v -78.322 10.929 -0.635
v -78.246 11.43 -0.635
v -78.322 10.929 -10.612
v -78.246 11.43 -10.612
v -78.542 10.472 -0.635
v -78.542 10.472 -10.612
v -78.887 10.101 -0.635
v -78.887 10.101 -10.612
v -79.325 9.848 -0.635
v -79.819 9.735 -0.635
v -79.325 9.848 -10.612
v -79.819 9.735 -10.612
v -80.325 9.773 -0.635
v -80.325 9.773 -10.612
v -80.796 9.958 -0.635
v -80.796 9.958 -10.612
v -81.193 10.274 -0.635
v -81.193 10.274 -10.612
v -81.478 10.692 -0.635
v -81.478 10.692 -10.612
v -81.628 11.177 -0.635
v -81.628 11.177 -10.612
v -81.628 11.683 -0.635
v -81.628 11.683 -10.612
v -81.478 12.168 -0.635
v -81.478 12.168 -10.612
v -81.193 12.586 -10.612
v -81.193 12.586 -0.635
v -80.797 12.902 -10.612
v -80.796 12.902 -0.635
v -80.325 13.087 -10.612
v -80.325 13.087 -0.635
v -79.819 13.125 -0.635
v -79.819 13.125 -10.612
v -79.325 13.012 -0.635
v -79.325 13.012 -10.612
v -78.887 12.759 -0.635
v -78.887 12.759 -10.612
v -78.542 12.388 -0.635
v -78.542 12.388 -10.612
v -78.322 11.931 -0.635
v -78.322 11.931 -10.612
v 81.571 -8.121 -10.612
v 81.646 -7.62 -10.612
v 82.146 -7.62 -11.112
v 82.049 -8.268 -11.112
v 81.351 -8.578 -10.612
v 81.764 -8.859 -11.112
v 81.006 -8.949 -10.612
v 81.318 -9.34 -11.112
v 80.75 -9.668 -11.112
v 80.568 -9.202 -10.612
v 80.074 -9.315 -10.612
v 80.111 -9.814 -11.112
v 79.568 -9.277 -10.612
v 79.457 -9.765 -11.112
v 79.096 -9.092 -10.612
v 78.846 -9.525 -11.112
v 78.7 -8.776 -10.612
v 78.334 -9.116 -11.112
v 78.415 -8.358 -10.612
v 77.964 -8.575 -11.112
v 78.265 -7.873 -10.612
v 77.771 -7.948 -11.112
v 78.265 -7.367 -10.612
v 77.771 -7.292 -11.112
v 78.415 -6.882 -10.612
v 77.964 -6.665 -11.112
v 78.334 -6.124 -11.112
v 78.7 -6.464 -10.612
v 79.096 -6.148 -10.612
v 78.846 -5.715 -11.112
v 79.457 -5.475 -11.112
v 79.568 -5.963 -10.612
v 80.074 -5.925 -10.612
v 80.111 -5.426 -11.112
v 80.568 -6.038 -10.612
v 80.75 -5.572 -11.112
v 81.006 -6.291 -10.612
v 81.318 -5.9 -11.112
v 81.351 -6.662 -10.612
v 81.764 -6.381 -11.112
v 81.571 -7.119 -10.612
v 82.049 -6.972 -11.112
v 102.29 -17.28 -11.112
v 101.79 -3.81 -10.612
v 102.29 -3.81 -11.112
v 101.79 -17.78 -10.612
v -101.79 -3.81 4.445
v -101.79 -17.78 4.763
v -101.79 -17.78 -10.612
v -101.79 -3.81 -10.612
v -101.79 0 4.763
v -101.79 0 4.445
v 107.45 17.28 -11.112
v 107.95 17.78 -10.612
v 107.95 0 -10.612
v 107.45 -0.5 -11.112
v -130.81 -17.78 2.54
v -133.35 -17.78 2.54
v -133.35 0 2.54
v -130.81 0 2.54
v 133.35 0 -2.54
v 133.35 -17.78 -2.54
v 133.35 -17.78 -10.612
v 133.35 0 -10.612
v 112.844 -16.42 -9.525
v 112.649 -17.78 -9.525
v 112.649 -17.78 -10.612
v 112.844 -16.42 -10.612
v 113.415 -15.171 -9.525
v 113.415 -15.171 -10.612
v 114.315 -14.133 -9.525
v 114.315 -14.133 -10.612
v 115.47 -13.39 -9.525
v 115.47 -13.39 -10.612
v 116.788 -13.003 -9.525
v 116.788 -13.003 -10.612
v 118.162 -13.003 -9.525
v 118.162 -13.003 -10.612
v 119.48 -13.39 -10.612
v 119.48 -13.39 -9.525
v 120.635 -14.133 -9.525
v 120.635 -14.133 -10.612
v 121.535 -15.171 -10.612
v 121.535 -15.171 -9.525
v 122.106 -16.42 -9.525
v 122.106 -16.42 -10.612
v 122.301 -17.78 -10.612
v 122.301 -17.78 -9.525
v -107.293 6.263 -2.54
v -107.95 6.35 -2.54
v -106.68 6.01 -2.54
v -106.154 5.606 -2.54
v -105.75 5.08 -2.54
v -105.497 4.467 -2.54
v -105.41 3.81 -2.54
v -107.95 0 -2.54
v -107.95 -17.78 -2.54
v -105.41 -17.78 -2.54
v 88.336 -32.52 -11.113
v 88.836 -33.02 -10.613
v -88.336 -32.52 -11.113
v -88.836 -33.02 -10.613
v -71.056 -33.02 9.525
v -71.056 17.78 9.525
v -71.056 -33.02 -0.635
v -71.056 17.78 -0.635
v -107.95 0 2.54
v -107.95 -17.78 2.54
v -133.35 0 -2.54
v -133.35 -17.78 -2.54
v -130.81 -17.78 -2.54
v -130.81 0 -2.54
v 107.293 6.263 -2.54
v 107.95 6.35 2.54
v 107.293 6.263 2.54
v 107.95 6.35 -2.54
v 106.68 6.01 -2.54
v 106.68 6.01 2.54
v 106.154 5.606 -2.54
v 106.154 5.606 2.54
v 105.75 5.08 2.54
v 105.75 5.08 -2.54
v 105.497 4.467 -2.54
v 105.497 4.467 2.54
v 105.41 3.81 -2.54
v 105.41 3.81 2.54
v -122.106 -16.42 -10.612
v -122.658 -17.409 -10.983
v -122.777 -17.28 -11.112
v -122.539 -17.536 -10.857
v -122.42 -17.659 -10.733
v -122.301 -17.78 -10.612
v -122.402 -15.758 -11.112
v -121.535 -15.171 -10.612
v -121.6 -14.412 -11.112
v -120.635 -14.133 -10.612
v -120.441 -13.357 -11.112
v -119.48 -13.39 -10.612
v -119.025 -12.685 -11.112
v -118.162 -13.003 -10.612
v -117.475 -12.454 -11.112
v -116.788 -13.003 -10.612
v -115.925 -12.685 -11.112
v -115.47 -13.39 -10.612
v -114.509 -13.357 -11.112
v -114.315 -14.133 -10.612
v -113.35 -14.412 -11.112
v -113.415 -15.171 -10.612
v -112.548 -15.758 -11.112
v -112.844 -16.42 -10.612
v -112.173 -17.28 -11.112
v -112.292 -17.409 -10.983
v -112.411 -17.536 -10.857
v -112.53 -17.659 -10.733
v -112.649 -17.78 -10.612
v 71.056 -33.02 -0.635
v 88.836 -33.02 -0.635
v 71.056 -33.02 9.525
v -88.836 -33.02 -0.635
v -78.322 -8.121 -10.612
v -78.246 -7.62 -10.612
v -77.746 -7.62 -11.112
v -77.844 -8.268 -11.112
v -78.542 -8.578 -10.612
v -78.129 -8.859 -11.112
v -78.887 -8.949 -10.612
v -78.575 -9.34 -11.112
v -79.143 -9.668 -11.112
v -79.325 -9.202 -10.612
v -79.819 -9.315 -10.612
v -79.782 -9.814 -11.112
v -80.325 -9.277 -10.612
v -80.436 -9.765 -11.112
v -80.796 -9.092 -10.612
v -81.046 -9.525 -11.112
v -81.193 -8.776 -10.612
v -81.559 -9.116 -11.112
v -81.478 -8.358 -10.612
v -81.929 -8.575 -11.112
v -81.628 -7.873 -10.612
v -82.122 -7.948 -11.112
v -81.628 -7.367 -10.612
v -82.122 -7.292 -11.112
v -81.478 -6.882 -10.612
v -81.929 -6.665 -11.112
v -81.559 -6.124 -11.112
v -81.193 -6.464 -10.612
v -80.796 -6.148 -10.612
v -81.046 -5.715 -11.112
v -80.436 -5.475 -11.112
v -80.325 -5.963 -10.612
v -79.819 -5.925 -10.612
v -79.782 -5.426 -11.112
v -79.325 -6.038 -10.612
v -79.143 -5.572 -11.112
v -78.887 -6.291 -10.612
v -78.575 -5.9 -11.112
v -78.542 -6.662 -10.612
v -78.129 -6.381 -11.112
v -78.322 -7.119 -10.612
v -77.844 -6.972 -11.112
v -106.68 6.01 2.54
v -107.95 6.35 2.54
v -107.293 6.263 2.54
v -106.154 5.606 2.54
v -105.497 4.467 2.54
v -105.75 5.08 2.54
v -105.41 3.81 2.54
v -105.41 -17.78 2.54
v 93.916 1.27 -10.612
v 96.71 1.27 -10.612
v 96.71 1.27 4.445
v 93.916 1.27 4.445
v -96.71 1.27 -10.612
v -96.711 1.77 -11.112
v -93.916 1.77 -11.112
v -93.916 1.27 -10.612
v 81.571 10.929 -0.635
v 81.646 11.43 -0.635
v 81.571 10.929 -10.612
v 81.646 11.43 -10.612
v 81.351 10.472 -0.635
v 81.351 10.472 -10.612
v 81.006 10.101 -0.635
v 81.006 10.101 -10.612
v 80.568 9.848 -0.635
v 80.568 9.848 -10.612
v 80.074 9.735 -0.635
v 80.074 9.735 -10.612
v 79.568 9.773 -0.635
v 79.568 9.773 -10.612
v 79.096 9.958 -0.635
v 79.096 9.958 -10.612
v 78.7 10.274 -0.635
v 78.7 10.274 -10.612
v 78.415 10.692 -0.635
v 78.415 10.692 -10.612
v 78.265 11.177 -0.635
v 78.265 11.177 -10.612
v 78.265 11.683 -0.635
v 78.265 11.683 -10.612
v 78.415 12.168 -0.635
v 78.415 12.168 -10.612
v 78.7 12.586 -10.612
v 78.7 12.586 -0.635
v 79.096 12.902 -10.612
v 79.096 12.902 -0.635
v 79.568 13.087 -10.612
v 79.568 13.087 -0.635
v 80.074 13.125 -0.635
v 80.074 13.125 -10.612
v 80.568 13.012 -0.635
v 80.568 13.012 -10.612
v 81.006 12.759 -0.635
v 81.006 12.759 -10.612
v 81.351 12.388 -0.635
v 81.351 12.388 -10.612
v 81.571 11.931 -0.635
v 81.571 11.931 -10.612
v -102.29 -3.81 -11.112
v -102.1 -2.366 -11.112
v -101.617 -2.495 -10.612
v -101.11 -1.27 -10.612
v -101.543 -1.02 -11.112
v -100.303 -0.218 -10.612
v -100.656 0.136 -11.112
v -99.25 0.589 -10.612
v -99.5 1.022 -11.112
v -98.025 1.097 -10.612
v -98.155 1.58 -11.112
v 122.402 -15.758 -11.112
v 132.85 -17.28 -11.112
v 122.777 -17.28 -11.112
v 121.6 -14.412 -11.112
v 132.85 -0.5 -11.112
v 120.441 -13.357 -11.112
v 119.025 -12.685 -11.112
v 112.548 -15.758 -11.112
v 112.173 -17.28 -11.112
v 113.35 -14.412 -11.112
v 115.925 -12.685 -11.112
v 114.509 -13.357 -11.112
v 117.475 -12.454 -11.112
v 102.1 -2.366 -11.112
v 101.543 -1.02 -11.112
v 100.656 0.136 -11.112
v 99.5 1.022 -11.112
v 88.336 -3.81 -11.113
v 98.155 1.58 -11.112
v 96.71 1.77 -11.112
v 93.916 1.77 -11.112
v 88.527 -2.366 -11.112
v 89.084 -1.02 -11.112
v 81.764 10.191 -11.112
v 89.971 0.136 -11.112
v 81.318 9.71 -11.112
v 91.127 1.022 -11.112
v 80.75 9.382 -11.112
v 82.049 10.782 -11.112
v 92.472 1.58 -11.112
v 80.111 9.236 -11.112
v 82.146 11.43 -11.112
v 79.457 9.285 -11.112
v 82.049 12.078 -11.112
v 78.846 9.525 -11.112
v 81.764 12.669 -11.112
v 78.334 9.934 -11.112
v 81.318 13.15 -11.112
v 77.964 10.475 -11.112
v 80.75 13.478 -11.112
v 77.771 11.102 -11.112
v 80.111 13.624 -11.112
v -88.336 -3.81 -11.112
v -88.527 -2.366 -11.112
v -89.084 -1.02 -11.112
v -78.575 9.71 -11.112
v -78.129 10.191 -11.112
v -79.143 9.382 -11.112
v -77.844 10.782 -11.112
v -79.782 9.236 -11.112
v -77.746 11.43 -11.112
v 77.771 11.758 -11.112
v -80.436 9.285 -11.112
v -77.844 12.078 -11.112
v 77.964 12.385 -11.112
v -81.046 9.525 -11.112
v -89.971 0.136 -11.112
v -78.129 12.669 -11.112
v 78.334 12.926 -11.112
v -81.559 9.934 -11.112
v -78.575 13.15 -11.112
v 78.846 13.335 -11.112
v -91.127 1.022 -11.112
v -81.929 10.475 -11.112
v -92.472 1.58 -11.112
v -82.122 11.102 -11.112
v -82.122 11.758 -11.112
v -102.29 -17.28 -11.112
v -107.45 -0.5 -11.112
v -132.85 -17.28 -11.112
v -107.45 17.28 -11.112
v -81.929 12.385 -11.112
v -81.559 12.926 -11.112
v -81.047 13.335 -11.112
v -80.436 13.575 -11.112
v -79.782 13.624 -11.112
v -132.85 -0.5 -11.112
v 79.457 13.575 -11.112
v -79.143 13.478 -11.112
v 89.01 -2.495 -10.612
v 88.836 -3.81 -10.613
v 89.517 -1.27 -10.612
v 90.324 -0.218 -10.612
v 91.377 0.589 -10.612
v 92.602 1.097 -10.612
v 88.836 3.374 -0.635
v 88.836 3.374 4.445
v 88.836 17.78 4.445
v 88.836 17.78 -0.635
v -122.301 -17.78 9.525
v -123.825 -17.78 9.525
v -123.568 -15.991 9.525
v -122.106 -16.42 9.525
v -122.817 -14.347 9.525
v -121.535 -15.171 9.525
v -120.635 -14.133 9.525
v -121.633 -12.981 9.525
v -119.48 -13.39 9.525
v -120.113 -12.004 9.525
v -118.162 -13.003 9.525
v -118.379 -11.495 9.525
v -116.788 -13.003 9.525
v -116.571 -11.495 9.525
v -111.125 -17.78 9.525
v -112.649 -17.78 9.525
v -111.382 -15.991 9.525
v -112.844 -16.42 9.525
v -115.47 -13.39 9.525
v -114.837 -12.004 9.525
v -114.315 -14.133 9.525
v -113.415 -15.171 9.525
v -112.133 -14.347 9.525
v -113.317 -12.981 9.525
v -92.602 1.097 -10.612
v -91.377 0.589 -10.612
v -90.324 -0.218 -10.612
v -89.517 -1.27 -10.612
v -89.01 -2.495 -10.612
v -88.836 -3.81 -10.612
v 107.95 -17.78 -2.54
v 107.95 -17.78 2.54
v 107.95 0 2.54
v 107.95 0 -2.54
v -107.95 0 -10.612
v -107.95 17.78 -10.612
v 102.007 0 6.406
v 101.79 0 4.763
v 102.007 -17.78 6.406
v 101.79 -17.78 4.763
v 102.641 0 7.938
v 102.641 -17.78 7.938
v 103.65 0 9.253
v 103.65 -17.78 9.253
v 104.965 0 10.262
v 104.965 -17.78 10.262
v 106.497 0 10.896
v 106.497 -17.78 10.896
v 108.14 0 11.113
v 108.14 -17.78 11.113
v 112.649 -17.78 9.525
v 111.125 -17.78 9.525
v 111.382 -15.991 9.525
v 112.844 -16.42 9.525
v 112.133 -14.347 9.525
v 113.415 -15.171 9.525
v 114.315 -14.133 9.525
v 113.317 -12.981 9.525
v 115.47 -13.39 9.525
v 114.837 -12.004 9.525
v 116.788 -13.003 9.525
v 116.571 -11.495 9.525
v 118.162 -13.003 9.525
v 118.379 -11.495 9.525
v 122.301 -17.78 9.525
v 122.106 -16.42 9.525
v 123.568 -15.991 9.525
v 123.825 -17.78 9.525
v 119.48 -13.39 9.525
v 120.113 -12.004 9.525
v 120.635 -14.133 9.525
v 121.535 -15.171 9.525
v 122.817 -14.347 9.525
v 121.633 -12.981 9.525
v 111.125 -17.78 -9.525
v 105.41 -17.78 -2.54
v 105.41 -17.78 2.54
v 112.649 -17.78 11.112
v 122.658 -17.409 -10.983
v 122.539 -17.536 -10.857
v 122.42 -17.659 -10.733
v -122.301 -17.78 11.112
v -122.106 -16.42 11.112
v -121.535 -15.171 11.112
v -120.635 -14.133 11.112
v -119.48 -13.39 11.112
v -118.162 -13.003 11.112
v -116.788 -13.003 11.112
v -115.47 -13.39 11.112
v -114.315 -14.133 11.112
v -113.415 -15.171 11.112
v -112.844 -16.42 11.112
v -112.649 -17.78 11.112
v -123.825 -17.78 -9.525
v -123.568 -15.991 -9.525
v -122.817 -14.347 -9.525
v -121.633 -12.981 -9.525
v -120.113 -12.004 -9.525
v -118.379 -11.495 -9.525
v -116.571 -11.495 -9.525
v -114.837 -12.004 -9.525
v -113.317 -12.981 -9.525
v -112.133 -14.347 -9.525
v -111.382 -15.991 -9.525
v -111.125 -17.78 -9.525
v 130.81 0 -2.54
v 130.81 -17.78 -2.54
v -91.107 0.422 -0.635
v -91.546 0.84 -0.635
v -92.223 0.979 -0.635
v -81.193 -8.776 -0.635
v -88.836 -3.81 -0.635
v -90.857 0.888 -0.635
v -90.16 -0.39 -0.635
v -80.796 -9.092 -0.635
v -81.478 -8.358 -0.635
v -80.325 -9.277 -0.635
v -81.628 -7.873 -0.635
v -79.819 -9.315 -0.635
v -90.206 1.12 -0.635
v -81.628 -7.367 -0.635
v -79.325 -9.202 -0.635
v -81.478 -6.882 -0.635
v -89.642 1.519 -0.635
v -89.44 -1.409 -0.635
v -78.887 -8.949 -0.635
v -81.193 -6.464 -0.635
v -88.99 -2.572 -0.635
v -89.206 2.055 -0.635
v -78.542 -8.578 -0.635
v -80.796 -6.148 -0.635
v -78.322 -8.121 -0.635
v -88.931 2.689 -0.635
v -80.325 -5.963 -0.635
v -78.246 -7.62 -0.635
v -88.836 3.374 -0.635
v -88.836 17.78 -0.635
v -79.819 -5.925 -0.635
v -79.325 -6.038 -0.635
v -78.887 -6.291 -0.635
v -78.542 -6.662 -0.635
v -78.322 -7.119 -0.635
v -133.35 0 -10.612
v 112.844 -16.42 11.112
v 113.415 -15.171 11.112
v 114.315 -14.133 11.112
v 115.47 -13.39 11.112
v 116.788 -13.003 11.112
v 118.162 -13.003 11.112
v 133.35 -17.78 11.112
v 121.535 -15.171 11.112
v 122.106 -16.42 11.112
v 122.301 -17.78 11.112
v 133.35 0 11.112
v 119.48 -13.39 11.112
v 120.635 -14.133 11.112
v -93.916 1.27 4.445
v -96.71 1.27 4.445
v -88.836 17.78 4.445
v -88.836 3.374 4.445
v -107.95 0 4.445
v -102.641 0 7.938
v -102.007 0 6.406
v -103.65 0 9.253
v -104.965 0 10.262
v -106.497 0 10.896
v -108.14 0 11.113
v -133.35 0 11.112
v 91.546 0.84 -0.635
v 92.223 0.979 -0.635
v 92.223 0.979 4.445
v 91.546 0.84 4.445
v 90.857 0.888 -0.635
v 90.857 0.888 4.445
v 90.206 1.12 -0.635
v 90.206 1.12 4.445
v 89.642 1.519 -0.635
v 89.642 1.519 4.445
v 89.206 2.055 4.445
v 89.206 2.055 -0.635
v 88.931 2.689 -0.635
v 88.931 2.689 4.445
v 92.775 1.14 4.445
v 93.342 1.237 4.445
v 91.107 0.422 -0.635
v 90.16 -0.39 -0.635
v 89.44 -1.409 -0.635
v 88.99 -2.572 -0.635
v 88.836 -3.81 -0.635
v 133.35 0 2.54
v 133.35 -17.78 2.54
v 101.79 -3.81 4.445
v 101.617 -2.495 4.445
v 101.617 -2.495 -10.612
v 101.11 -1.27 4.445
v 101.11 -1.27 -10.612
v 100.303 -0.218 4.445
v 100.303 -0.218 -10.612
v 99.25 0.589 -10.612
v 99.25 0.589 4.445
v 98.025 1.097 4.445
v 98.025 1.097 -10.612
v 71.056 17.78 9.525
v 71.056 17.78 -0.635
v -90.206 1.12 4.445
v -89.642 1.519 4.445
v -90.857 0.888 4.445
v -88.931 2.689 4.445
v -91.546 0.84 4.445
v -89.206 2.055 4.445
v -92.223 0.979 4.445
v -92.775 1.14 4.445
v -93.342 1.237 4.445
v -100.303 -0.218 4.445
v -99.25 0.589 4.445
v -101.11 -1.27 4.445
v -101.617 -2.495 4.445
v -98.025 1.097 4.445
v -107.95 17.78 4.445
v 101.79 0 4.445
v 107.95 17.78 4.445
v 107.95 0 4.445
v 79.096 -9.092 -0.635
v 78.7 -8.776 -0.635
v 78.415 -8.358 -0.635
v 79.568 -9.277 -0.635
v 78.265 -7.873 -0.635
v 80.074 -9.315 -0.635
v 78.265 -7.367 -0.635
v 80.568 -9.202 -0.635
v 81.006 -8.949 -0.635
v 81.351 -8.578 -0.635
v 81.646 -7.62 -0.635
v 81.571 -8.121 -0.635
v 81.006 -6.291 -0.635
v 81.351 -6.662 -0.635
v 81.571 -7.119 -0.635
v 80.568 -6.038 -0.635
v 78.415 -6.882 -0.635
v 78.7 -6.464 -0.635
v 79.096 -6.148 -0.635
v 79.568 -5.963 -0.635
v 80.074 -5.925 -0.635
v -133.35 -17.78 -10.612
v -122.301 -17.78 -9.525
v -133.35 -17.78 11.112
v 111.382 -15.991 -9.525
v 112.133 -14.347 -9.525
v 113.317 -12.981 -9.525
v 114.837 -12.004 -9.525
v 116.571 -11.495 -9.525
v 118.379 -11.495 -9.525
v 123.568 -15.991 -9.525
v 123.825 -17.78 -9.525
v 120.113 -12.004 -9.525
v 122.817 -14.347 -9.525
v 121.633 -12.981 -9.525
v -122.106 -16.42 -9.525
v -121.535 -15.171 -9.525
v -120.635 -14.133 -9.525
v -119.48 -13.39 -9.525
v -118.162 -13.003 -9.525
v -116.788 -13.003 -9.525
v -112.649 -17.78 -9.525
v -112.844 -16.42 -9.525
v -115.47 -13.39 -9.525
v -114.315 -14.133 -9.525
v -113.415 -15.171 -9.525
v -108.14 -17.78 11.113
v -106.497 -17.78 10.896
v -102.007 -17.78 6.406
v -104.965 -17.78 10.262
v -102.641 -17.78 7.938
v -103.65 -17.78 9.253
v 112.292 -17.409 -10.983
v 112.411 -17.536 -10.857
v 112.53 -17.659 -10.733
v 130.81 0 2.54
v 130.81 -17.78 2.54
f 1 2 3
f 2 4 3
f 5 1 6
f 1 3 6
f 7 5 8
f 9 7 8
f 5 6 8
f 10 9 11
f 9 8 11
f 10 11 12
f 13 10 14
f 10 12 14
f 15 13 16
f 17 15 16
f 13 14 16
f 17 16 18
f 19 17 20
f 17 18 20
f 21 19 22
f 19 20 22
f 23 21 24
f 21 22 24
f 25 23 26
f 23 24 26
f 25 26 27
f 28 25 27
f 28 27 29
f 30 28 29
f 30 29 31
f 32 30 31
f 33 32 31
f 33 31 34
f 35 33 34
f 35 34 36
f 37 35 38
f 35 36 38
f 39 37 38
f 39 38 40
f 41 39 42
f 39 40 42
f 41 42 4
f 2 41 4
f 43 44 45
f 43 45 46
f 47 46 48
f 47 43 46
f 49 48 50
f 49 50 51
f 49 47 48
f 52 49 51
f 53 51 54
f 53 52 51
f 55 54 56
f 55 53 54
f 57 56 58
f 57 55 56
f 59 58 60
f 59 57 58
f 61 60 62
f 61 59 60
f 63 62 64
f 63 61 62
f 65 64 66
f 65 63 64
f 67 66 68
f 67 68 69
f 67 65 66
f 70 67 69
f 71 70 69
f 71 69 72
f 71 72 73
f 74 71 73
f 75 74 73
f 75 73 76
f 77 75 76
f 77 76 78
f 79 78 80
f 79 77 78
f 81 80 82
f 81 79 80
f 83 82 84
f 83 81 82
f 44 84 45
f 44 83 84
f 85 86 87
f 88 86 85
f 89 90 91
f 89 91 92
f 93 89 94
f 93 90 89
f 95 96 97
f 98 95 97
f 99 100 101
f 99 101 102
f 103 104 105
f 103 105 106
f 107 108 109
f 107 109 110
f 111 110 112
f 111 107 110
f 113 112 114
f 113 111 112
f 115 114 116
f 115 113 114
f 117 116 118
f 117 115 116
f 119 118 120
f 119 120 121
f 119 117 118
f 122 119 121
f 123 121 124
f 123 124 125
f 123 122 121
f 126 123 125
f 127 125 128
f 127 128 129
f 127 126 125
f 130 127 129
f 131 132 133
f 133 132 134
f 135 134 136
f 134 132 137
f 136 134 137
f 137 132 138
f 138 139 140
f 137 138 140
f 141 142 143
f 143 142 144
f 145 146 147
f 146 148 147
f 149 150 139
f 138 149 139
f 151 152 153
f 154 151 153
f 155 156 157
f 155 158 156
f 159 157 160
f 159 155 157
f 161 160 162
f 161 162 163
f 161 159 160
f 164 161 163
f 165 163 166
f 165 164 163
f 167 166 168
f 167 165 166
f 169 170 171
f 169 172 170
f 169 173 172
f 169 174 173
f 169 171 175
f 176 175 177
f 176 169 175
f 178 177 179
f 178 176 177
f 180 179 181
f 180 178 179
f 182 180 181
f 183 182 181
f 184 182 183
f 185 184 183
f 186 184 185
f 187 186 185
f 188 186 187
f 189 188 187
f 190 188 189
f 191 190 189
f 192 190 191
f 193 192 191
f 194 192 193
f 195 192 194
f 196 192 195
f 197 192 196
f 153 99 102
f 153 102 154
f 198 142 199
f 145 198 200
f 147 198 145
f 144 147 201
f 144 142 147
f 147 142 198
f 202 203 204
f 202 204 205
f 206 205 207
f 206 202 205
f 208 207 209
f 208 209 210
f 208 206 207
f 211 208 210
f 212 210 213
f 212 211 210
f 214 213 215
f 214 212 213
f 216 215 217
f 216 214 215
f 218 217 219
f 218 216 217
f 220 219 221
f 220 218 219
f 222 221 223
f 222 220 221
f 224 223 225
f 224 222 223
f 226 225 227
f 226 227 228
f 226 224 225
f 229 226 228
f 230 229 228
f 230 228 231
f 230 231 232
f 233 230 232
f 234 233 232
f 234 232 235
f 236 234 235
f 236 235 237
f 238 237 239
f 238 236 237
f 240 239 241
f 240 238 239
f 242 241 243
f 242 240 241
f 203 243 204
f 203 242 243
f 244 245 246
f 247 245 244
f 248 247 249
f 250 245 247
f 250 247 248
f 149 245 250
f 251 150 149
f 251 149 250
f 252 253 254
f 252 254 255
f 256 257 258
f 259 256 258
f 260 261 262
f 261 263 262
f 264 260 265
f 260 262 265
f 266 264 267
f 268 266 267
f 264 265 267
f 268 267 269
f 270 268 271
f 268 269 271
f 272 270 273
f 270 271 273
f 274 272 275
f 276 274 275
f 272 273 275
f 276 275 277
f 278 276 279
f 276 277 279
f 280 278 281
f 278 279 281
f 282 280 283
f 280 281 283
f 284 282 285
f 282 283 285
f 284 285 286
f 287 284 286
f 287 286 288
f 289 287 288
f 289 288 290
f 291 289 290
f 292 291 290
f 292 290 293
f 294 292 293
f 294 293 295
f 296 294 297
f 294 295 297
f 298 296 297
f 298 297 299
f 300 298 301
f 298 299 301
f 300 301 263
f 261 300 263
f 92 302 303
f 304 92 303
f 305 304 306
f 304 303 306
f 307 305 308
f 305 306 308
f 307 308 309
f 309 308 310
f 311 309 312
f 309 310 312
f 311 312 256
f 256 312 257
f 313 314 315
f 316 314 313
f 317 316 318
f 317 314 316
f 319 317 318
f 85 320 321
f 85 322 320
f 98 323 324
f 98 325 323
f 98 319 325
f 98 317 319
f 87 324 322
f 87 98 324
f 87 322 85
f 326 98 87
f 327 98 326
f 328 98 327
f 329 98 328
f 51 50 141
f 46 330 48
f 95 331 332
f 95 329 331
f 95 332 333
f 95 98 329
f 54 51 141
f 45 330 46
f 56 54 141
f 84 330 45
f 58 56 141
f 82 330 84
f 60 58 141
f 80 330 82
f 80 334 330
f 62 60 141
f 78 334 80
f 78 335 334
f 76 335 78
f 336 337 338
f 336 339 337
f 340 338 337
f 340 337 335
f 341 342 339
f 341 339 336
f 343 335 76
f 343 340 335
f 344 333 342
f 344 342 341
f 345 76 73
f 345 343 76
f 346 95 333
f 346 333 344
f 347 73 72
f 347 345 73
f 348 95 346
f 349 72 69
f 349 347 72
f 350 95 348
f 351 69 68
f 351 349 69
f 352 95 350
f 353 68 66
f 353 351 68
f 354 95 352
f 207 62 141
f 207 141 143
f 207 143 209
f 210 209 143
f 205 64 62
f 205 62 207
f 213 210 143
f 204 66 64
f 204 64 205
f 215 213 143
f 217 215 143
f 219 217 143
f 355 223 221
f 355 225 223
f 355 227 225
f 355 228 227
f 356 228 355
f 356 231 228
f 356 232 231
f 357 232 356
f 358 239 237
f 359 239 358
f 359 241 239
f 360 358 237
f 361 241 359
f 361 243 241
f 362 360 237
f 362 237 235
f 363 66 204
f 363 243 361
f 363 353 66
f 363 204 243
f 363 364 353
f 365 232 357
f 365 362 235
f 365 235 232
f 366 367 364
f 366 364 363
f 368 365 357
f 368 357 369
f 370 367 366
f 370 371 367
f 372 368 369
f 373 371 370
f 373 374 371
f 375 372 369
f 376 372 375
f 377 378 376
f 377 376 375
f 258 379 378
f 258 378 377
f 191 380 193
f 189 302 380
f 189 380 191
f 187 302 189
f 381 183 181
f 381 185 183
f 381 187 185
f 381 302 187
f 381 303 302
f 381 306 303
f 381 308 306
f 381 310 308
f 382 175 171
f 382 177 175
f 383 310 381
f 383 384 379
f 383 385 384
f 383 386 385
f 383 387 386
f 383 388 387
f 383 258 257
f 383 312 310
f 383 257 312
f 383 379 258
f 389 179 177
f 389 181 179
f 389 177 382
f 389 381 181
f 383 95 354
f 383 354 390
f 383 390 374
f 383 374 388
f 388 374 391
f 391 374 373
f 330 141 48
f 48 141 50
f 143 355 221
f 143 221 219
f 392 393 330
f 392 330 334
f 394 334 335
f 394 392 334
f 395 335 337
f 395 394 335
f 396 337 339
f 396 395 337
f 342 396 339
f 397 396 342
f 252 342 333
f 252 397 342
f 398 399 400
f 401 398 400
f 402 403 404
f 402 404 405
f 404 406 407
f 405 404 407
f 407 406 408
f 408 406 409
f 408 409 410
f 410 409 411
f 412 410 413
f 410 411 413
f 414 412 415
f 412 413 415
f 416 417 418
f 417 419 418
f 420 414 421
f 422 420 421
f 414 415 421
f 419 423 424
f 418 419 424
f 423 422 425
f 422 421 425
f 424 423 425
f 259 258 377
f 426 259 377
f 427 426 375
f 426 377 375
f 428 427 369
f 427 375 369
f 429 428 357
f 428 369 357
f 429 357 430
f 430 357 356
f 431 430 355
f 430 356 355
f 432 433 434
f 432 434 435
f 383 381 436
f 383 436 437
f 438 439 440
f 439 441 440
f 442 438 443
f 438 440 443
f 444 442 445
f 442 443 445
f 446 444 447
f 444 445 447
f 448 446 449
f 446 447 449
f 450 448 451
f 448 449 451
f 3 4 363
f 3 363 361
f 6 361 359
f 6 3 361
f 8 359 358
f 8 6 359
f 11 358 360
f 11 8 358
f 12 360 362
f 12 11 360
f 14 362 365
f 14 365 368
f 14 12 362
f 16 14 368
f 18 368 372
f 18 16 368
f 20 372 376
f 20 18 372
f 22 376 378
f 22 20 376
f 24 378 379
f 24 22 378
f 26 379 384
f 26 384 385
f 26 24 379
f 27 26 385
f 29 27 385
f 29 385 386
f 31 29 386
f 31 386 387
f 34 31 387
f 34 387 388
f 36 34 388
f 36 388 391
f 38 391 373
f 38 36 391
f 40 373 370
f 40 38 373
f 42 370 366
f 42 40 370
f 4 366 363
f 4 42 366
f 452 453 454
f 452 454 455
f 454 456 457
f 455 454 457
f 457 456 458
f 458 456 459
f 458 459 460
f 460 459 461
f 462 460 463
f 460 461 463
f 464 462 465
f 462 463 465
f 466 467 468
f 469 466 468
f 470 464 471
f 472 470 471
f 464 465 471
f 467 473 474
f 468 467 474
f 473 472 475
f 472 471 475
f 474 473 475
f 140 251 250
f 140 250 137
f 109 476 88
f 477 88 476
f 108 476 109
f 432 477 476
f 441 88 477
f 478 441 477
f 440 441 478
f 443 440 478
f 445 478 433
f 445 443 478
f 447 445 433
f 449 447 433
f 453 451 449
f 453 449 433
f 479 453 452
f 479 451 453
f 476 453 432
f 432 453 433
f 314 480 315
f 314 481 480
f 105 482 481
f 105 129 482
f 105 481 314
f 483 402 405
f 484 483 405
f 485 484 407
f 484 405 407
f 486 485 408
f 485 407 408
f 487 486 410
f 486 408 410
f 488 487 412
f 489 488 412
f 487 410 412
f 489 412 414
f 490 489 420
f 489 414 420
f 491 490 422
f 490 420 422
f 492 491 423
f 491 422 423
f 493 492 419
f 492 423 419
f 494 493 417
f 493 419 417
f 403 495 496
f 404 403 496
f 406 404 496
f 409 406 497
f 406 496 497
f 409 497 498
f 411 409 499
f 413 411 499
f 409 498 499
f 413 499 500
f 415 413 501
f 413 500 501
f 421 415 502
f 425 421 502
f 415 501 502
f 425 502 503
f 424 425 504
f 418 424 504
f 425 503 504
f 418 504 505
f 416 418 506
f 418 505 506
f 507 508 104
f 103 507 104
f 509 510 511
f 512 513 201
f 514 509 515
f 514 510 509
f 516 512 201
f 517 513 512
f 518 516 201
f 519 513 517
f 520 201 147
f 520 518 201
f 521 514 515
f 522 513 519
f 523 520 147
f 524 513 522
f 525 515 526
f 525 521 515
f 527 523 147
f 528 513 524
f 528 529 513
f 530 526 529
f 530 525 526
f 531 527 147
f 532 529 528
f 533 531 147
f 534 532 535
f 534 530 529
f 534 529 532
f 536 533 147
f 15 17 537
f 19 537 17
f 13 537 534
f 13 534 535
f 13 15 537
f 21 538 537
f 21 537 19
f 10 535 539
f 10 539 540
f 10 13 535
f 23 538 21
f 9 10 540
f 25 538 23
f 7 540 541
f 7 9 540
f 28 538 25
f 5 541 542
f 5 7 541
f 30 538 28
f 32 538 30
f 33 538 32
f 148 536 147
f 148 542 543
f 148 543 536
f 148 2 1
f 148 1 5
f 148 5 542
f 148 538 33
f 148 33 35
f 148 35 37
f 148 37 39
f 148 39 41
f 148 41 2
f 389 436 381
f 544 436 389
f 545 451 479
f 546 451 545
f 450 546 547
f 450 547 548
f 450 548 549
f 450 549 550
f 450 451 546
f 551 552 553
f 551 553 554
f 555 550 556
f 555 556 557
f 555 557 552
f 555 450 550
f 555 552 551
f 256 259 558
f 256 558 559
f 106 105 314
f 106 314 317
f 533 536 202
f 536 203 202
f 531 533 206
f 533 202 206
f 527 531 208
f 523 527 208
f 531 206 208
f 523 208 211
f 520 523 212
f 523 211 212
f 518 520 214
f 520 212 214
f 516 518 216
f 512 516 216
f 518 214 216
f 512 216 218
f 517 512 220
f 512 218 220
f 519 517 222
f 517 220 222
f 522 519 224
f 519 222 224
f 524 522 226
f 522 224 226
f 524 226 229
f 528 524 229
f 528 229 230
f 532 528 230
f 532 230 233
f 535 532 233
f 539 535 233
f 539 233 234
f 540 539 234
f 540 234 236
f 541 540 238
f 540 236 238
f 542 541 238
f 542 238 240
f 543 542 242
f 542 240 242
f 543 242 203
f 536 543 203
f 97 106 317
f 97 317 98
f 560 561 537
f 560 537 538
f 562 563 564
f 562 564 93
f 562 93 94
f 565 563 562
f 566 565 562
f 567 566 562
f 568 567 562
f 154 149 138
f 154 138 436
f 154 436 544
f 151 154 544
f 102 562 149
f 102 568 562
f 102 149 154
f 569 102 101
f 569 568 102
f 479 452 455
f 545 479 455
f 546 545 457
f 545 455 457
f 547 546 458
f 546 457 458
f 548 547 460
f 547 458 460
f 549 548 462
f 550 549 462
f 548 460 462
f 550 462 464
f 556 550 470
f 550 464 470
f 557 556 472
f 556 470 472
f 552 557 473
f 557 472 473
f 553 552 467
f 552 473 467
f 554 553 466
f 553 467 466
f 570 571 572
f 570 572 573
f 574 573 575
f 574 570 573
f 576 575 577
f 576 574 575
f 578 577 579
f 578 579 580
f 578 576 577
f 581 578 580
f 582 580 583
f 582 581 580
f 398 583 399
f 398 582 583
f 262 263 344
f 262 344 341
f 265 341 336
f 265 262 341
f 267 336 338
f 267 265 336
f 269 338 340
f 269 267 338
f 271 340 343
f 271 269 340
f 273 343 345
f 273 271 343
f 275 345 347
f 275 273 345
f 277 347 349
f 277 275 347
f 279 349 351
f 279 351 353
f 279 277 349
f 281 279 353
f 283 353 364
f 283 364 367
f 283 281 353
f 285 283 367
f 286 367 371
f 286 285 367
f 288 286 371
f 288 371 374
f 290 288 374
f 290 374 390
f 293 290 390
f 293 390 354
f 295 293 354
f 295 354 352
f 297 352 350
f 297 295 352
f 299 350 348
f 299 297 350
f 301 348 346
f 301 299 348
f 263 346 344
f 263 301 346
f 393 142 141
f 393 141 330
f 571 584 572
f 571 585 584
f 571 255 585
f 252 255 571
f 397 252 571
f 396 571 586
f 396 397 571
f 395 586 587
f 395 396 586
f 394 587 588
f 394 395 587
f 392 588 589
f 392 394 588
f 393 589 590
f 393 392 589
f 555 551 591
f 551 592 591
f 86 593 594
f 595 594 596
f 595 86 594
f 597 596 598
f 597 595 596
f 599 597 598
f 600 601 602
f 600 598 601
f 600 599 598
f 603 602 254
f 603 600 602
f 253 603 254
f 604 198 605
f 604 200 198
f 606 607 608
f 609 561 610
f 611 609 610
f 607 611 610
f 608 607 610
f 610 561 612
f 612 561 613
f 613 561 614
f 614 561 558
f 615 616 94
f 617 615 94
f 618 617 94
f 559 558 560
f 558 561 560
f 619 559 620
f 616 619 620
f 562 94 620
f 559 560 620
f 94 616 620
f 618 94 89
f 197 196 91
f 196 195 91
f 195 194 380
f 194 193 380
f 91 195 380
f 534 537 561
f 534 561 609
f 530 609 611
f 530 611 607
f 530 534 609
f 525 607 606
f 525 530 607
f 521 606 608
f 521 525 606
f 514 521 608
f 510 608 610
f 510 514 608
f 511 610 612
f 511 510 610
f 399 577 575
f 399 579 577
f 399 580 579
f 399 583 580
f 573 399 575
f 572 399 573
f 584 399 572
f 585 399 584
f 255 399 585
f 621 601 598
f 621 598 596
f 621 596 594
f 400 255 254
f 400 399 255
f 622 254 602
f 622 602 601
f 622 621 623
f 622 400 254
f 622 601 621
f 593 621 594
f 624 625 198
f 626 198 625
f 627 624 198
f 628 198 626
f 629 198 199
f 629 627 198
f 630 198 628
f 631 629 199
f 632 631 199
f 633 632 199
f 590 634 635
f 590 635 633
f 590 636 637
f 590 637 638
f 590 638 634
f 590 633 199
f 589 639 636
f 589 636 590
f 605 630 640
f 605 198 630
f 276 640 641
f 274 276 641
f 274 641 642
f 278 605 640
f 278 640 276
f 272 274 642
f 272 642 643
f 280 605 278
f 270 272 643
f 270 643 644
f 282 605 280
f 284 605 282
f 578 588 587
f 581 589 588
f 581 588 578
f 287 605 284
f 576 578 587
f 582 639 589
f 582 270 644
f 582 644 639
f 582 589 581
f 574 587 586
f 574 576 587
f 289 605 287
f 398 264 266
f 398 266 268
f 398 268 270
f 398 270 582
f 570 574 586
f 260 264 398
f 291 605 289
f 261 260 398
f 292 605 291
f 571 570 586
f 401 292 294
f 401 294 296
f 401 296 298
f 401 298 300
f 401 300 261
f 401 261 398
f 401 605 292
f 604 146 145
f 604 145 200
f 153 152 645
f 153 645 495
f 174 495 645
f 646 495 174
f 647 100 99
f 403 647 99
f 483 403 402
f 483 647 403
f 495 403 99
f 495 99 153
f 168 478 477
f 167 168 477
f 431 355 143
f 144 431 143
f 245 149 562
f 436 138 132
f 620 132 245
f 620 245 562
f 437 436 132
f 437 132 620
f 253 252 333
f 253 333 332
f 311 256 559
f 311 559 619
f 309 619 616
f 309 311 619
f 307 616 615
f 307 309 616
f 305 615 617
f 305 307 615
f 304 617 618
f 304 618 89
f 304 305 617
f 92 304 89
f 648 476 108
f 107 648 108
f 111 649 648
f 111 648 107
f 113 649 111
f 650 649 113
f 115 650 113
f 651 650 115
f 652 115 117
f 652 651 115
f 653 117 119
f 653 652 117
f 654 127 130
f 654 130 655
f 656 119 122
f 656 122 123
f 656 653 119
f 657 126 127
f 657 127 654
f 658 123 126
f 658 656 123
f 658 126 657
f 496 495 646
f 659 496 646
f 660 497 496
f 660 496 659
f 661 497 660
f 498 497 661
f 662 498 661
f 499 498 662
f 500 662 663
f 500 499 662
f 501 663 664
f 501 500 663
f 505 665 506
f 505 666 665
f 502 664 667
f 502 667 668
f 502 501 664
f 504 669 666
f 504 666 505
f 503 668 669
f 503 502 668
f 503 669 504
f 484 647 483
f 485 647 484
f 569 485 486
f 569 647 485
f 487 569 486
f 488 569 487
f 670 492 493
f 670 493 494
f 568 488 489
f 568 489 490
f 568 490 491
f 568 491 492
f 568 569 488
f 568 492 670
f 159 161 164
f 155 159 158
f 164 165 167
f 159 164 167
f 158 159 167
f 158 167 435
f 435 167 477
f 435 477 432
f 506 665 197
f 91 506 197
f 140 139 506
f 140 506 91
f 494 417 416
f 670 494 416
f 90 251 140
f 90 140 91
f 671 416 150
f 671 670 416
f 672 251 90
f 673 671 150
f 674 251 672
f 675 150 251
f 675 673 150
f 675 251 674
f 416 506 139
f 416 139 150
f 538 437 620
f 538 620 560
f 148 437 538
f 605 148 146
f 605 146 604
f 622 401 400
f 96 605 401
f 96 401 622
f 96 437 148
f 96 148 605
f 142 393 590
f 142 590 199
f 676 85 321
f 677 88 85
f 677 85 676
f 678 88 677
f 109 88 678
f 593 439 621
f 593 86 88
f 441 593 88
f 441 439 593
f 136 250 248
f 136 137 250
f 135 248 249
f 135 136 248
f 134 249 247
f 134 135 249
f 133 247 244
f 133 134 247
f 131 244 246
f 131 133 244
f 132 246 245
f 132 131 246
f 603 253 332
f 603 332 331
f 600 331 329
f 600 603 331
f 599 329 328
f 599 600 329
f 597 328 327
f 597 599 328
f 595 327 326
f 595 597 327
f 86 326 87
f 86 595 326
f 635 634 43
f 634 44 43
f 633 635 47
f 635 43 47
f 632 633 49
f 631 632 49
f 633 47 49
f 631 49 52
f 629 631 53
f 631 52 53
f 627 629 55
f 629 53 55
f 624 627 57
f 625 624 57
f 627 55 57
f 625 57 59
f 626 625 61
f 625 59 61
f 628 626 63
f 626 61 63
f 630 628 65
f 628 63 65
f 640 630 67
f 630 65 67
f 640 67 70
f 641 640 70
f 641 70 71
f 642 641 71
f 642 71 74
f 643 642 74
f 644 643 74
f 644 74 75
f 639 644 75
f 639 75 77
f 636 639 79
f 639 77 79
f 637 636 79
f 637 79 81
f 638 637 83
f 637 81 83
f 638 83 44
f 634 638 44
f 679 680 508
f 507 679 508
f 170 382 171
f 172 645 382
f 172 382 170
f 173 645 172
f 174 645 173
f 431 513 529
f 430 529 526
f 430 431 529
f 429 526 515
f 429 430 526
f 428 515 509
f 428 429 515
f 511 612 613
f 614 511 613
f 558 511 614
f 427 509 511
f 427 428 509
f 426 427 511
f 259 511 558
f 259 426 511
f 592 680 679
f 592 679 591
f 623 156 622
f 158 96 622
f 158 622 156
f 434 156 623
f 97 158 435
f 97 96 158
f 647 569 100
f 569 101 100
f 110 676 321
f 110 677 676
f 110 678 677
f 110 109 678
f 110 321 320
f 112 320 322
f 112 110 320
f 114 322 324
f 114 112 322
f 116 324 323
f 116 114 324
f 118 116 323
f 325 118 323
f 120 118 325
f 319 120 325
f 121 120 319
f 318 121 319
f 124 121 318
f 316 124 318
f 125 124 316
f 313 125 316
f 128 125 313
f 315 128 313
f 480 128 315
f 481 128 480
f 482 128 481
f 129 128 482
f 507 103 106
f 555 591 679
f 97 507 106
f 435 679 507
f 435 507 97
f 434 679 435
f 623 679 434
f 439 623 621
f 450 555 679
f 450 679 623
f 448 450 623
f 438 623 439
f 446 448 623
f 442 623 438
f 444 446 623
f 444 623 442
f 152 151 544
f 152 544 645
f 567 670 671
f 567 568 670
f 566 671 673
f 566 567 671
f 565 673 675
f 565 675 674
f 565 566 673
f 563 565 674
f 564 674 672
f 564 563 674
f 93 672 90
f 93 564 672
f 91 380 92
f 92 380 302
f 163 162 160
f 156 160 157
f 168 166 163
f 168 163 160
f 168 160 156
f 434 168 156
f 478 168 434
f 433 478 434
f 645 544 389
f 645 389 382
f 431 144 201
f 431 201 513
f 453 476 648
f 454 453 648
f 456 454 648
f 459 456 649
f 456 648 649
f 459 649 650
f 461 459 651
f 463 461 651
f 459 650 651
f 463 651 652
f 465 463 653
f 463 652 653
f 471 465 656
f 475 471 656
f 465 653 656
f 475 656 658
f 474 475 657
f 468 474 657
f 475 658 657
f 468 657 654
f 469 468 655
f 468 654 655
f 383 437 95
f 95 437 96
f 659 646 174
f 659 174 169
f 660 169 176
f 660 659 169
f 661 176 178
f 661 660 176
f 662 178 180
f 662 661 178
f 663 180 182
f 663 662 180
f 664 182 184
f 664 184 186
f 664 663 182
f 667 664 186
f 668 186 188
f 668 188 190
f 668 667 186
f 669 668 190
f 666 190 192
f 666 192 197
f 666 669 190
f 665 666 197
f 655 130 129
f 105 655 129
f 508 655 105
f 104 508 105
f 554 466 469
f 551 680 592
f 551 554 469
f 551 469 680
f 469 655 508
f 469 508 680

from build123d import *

# Parameters (mm, degrees)
BOSS_EXTRUDE1_DEPTH      = 9.525
BOSS_EXTRUDE1_DEPTH_BACK = 9.525
SKETCH1_R                = 1.7
CUT_EXTRUDE1_DEPTH       = 6.35
CUT_EXTRUDE1_DEPTH_BACK  = 27.686
SKETCH2_W                = 2.54
SKETCH2_H                = 5.08
BOSS_EXTRUDE2_DEPTH      = 1.5875
BOSS_EXTRUDE3_START      = 1.5875
SKETCH5_R                = 1.7
BOSS_EXTRUDE3_DEPTH      = 1.5875
CUT_EXTRUDE2_START       = -5.08
CUT_EXTRUDE2_DEPTH       = 5.08
FILLET1_R                = 6.35
FILLET2_R                = 2.54
CHAMFER1_SIZE            = 0.5
SKETCH8_W                = 17.78
SKETCH8_H                = 50.8
CUT_EXTRUDE3_DEPTH       = 5.08
FILLET3_START            = -0.635
FILLET3_DEPTH            = 5.635


with BuildPart() as part:
    # Sketch1 → Boss-Extrude1 (new, two sides: drawn at the far end of the back side and taken through both)
    with BuildSketch(Plane.XY.offset(-BOSS_EXTRUDE1_DEPTH_BACK)):
        with BuildLine():
            Line((-107.95, 0), (-133.35, 0))
            Line((-133.35, 0), (-133.35, -17.78))
            Line((-133.35, -17.78), (-123.825, -17.78))
            ThreePointArc((-123.825, -17.78), (-117.475, -11.43), (-111.125, -17.78))
            Line((-111.125, -17.78), (-101.7905, -17.78))
            Line((-101.7905, -17.78), (-101.7905, -3.81))
            ThreePointArc((-101.7905, -3.81), (-100.302602448, -0.217897552), (-96.7105, 1.27))
            Line((-96.7105, 1.27), (-93.9165, 1.27))
            ThreePointArc((-93.9165, 1.27), (-90.324397552, -0.217897552), (-88.8365, -3.81))
            Line((-88.8365, -3.81), (-88.8365, -17.78))
            Line((-88.8365, -17.78), (-88.8365, -33.02))
            Line((-88.8365, -33.02), (88.8365, -33.02))
            Line((88.8365, -33.02), (88.8365, -17.78))
            Line((88.8365, -17.78), (88.8365, -3.81))
            ThreePointArc((88.8365, -3.81), (90.324397552, -0.217897552), (93.9165, 1.27))
            Line((93.9165, 1.27), (96.7105, 1.27))
            ThreePointArc((96.7105, 1.27), (100.302602448, -0.217897552), (101.7905, -3.81))
            Line((101.7905, -3.81), (101.7905, -17.78))
            Line((101.7905, -17.78), (111.125, -17.78))
            ThreePointArc((111.125, -17.78), (117.475, -11.43), (123.825, -17.78))
            Line((123.825, -17.78), (133.35, -17.78))
            Line((133.35, -17.78), (133.35, 0))
            Line((133.35, 0), (107.95, 0))
            Line((107.95, 0), (107.95, 17.78))
            Line((107.95, 17.78), (-107.95, 17.78))
            Line((-107.95, 17.78), (-107.95, 0))
        make_face()
        with Locations((-79.9465, -7.62)):
            Circle(SKETCH1_R, mode=Mode.SUBTRACT)
        with Locations((-79.9465, 11.43)):
            Circle(SKETCH1_R, mode=Mode.SUBTRACT)
        with Locations((79.9465, -7.62)):
            Circle(SKETCH1_R, mode=Mode.SUBTRACT)
        with Locations((79.9465, 11.43)):
            Circle(SKETCH1_R, mode=Mode.SUBTRACT)
    extrude(amount=BOSS_EXTRUDE1_DEPTH + BOSS_EXTRUDE1_DEPTH_BACK)

    # Sketch2 → Cut-Extrude1 (cut, two sides: drawn at the far end of the back side and taken through both)
    with BuildSketch(Plane(origin=(0, 0, 0), x_dir=(1, 0, 0), z_dir=(0, 1, 0)).offset(-CUT_EXTRUDE1_DEPTH_BACK)):
        with Locations((-106.68, 0)):
            Rectangle(SKETCH2_W, SKETCH2_H)
        with Locations((-132.08, 0)):
            Rectangle(SKETCH2_W, SKETCH2_H)
        with Locations((132.08, 0)):
            Rectangle(SKETCH2_W, SKETCH2_H)
        with Locations((106.68, 0)):
            Rectangle(SKETCH2_W, SKETCH2_H)
    extrude(amount=CUT_EXTRUDE1_DEPTH + CUT_EXTRUDE1_DEPTH_BACK, mode=Mode.SUBTRACT)

    # Sketch3 → Boss-Extrude2 (add)
    with BuildSketch(Plane.XY.offset(9.525)):
        with BuildLine():
            Line((-101.7905, -17.78), (-101.7905, 0))
            Line((-101.7905, 0), (-133.35, 0))
            Line((-133.35, 0), (-133.35, -17.78))
            Line((-133.35, -17.78), (-122.301, -17.78))
            ThreePointArc((-122.301, -17.78), (-117.475, -12.954), (-112.649, -17.78))
            Line((-112.649, -17.78), (-101.7905, -17.78))
        make_face()
        with BuildLine():
            Line((101.7905, -17.78), (112.649, -17.78))
            ThreePointArc((112.649, -17.78), (117.475, -12.954), (122.301, -17.78))
            Line((122.301, -17.78), (133.35, -17.78))
            Line((133.35, -17.78), (133.35, 0))
            Line((133.35, 0), (101.7905, 0))
            Line((101.7905, 0), (101.7905, -17.78))
        make_face()
    boss_extrude2 = extrude(amount=BOSS_EXTRUDE2_DEPTH)

    # Mirror1: Boss-Extrude2 across plane
    add(boss_extrude2.mirror(Plane.XY))

    # Sketch5 → Boss-Extrude3 (add)
    with BuildSketch(Plane(origin=(0, 0, -9.525), x_dir=(-1, 0, 0), z_dir=(0, 0, -1)).offset(BOSS_EXTRUDE3_START)):
        with BuildLine():
            Line((-107.95, 0), (-101.7905, 0))
            Line((-101.7905, 0), (-101.7905, -3.81))
            ThreePointArc((-101.7905, -3.81), (-100.302602448, -0.217897552), (-96.7105, 1.27))
            Line((-96.7105, 1.27), (-93.9165, 1.27))
            ThreePointArc((-93.9165, 1.27), (-90.324397552, -0.217897552), (-88.8365, -3.81))
            Line((-88.8365, -3.81), (-88.8365, -33.02))
            Line((-88.8365, -33.02), (88.8365, -33.02))
            Line((88.8365, -33.02), (88.8365, -3.81))
            ThreePointArc((88.8365, -3.81), (90.324397552, -0.217897552), (93.9165, 1.27))
            Line((93.9165, 1.27), (96.7105, 1.27))
            ThreePointArc((96.7105, 1.27), (100.302602448, -0.217897552), (101.7905, -3.81))
            Line((101.7905, -3.81), (101.7905, 0))
            Line((101.7905, 0), (107.95, 0))
            Line((107.95, 0), (107.95, 17.78))
            Line((107.95, 17.78), (-107.95, 17.78))
            Line((-107.95, 17.78), (-107.95, 0))
        make_face()
        with Locations(Location((-79.9465, -7.62, 0), (0, 0, 180))):
            Circle(SKETCH5_R, mode=Mode.SUBTRACT)
        with Locations(Location((-79.9465, 11.43, 0), (0, 0, 180))):
            Circle(SKETCH5_R, mode=Mode.SUBTRACT)
        with Locations(Location((79.9465, -7.62, 0), (0, 0, 180))):
            Circle(SKETCH5_R, mode=Mode.SUBTRACT)
        with Locations(Location((79.9465, 11.43, 0), (0, 0, 180))):
            Circle(SKETCH5_R, mode=Mode.SUBTRACT)
    extrude(amount=-BOSS_EXTRUDE3_DEPTH)

    # Sketch7 → Cut-Extrude2 (cut)
    with BuildSketch(Plane.XY.offset(9.525).offset(CUT_EXTRUDE2_START)):
        with BuildLine():
            Line((-88.8365, -33.02), (-88.8365, -3.81))
            ThreePointArc((-88.8365, -3.81), (-90.324397552, -0.217897552), (-93.9165, 1.27))
            Line((-93.9165, 1.27), (-96.7105, 1.27))
            ThreePointArc((-96.7105, 1.27), (-100.302602448, -0.217897552), (-101.7905, -3.81))
            Line((-101.7905, -3.81), (-101.7905, 0))
            Line((-101.7905, 0), (-107.95, 0))
            Line((-107.95, 0), (-107.95, 17.78))
            Line((-107.95, 17.78), (-71.0565, 17.78))
            Line((-71.0565, 17.78), (-71.0565, -33.02))
            Line((-71.0565, -33.02), (-88.8365, -33.02))
        make_face()
        with BuildLine():
            Line((71.0565, -33.02), (88.8365, -33.02))
            Line((88.8365, -33.02), (88.8365, -3.81))
            ThreePointArc((88.8365, -3.81), (90.324397552, -0.217897552), (93.9165, 1.27))
            Line((93.9165, 1.27), (96.7105, 1.27))
            ThreePointArc((96.7105, 1.27), (100.302602448, -0.217897552), (101.7905, -3.81))
            Line((101.7905, -3.81), (101.7905, 0))
            Line((101.7905, 0), (107.95, 0))
            Line((107.95, 0), (107.95, 17.78))
            Line((107.95, 17.78), (71.0565, 17.78))
            Line((71.0565, 17.78), (71.0565, -33.02))
        make_face()
    extrude(amount=CUT_EXTRUDE2_DEPTH, mode=Mode.SUBTRACT)

    # Fillet1
    fillet1_edges = [part.edges().sort_by_distance(p)[0] for p in [
        (-101.7905, -8.89, 11.1125),
        (101.7905, -8.89, 11.1125),
    ]]
    fillet(fillet1_edges, radius=FILLET1_R)

    # Fillet2
    fillet2_edges = [part.edges().sort_by_distance(p)[0] for p in [
        (105.41, 6.35, 0),
        (-105.41, 6.35, 0),
    ]]
    fillet(fillet2_edges, radius=FILLET2_R - 0.0001)  # a hair under: the kernel refuses the full size

    # Chamfer1
    chamfer1_edges = [part.edges().sort_by_distance(p)[0] for p in [
        (-107.21975, -17.78, -11.1125),
        (-117.475, -12.954, -11.1125),
        (-127.8255, -17.78, -11.1125),
        (-133.35, -8.89, -11.1125),
        (-101.7905, -10.795, -11.1125),
        (117.475, -12.954, -11.1125),
        (107.21975, -17.78, -11.1125),
        (120.65, 0, -11.1125),
        (133.35, -8.89, -11.1125),
        (127.8255, -17.78, -11.1125),
        (101.7905, -10.795, -11.1125),
        (-120.65, 0, -11.1125),
        (-81.6465, -7.62, -11.1125),
        (78.2465, 11.43, -11.1125),
        (78.2465, -7.62, -11.1125),
        (-81.6465, 11.43, -11.1125),
        (0, 17.78, -11.1125),
        (107.95, 8.89, -11.1125),
        (100.302602448, -0.217897552, -11.1125),
        (95.3135, 1.27, -11.1125),
        (90.324397552, -0.217897552, -11.1125),
        (88.8365, -18.415, -11.1125),
        (0, -33.02, -11.1125),
        (-88.8365, -18.415, -11.1125),
        (-90.324397552, -0.217897552, -11.1125),
        (-95.3135, 1.27, -11.1125),
        (-100.302602448, -0.217897552, -11.1125),
        (-107.95, 8.89, -11.1125),
    ]]
    chamfer(chamfer1_edges, length=CHAMFER1_SIZE)

    # Sketch8 → Cut-Extrude3 (cut)
    with BuildSketch(Plane.XY.offset(4.445)):
        with Locations((-79.9465, -7.62)):
            Rectangle(SKETCH8_W, SKETCH8_H)
        with Locations((79.9465, -7.62)):
            Rectangle(SKETCH8_W, SKETCH8_H)
    extrude(amount=-CUT_EXTRUDE3_DEPTH, mode=Mode.SUBTRACT)

    # Fillet3: read off the stored shape, not the designer's step
    # Fillet3 outline → Fillet3 (cut)
    with BuildSketch(Plane.XY.offset(FILLET3_START)):
        with BuildLine():
            ThreePointArc((92.223166667, 0.979469931), (89.910030316, 1.300303581), (88.8365, 3.374204897))
            Line((88.8365, 3.374204897), (88.8365, -3.81))
            ThreePointArc((88.8365, -3.81), (89.768697369, -0.877060633), (92.223166667, 0.979469931))
        make_face()
        with BuildLine():
            ThreePointArc((-88.8365, 3.374204897), (-89.910030316, 1.300303581), (-92.223166667, 0.979469931))
            ThreePointArc((-92.223166667, 0.979469931), (-89.768697369, -0.877060633), (-88.8365, -3.81))
            Line((-88.8365, -3.81), (-88.8365, 3.374204897))
        make_face()
    extrude(amount=FILLET3_DEPTH, mode=Mode.SUBTRACT)


solid = part.part
